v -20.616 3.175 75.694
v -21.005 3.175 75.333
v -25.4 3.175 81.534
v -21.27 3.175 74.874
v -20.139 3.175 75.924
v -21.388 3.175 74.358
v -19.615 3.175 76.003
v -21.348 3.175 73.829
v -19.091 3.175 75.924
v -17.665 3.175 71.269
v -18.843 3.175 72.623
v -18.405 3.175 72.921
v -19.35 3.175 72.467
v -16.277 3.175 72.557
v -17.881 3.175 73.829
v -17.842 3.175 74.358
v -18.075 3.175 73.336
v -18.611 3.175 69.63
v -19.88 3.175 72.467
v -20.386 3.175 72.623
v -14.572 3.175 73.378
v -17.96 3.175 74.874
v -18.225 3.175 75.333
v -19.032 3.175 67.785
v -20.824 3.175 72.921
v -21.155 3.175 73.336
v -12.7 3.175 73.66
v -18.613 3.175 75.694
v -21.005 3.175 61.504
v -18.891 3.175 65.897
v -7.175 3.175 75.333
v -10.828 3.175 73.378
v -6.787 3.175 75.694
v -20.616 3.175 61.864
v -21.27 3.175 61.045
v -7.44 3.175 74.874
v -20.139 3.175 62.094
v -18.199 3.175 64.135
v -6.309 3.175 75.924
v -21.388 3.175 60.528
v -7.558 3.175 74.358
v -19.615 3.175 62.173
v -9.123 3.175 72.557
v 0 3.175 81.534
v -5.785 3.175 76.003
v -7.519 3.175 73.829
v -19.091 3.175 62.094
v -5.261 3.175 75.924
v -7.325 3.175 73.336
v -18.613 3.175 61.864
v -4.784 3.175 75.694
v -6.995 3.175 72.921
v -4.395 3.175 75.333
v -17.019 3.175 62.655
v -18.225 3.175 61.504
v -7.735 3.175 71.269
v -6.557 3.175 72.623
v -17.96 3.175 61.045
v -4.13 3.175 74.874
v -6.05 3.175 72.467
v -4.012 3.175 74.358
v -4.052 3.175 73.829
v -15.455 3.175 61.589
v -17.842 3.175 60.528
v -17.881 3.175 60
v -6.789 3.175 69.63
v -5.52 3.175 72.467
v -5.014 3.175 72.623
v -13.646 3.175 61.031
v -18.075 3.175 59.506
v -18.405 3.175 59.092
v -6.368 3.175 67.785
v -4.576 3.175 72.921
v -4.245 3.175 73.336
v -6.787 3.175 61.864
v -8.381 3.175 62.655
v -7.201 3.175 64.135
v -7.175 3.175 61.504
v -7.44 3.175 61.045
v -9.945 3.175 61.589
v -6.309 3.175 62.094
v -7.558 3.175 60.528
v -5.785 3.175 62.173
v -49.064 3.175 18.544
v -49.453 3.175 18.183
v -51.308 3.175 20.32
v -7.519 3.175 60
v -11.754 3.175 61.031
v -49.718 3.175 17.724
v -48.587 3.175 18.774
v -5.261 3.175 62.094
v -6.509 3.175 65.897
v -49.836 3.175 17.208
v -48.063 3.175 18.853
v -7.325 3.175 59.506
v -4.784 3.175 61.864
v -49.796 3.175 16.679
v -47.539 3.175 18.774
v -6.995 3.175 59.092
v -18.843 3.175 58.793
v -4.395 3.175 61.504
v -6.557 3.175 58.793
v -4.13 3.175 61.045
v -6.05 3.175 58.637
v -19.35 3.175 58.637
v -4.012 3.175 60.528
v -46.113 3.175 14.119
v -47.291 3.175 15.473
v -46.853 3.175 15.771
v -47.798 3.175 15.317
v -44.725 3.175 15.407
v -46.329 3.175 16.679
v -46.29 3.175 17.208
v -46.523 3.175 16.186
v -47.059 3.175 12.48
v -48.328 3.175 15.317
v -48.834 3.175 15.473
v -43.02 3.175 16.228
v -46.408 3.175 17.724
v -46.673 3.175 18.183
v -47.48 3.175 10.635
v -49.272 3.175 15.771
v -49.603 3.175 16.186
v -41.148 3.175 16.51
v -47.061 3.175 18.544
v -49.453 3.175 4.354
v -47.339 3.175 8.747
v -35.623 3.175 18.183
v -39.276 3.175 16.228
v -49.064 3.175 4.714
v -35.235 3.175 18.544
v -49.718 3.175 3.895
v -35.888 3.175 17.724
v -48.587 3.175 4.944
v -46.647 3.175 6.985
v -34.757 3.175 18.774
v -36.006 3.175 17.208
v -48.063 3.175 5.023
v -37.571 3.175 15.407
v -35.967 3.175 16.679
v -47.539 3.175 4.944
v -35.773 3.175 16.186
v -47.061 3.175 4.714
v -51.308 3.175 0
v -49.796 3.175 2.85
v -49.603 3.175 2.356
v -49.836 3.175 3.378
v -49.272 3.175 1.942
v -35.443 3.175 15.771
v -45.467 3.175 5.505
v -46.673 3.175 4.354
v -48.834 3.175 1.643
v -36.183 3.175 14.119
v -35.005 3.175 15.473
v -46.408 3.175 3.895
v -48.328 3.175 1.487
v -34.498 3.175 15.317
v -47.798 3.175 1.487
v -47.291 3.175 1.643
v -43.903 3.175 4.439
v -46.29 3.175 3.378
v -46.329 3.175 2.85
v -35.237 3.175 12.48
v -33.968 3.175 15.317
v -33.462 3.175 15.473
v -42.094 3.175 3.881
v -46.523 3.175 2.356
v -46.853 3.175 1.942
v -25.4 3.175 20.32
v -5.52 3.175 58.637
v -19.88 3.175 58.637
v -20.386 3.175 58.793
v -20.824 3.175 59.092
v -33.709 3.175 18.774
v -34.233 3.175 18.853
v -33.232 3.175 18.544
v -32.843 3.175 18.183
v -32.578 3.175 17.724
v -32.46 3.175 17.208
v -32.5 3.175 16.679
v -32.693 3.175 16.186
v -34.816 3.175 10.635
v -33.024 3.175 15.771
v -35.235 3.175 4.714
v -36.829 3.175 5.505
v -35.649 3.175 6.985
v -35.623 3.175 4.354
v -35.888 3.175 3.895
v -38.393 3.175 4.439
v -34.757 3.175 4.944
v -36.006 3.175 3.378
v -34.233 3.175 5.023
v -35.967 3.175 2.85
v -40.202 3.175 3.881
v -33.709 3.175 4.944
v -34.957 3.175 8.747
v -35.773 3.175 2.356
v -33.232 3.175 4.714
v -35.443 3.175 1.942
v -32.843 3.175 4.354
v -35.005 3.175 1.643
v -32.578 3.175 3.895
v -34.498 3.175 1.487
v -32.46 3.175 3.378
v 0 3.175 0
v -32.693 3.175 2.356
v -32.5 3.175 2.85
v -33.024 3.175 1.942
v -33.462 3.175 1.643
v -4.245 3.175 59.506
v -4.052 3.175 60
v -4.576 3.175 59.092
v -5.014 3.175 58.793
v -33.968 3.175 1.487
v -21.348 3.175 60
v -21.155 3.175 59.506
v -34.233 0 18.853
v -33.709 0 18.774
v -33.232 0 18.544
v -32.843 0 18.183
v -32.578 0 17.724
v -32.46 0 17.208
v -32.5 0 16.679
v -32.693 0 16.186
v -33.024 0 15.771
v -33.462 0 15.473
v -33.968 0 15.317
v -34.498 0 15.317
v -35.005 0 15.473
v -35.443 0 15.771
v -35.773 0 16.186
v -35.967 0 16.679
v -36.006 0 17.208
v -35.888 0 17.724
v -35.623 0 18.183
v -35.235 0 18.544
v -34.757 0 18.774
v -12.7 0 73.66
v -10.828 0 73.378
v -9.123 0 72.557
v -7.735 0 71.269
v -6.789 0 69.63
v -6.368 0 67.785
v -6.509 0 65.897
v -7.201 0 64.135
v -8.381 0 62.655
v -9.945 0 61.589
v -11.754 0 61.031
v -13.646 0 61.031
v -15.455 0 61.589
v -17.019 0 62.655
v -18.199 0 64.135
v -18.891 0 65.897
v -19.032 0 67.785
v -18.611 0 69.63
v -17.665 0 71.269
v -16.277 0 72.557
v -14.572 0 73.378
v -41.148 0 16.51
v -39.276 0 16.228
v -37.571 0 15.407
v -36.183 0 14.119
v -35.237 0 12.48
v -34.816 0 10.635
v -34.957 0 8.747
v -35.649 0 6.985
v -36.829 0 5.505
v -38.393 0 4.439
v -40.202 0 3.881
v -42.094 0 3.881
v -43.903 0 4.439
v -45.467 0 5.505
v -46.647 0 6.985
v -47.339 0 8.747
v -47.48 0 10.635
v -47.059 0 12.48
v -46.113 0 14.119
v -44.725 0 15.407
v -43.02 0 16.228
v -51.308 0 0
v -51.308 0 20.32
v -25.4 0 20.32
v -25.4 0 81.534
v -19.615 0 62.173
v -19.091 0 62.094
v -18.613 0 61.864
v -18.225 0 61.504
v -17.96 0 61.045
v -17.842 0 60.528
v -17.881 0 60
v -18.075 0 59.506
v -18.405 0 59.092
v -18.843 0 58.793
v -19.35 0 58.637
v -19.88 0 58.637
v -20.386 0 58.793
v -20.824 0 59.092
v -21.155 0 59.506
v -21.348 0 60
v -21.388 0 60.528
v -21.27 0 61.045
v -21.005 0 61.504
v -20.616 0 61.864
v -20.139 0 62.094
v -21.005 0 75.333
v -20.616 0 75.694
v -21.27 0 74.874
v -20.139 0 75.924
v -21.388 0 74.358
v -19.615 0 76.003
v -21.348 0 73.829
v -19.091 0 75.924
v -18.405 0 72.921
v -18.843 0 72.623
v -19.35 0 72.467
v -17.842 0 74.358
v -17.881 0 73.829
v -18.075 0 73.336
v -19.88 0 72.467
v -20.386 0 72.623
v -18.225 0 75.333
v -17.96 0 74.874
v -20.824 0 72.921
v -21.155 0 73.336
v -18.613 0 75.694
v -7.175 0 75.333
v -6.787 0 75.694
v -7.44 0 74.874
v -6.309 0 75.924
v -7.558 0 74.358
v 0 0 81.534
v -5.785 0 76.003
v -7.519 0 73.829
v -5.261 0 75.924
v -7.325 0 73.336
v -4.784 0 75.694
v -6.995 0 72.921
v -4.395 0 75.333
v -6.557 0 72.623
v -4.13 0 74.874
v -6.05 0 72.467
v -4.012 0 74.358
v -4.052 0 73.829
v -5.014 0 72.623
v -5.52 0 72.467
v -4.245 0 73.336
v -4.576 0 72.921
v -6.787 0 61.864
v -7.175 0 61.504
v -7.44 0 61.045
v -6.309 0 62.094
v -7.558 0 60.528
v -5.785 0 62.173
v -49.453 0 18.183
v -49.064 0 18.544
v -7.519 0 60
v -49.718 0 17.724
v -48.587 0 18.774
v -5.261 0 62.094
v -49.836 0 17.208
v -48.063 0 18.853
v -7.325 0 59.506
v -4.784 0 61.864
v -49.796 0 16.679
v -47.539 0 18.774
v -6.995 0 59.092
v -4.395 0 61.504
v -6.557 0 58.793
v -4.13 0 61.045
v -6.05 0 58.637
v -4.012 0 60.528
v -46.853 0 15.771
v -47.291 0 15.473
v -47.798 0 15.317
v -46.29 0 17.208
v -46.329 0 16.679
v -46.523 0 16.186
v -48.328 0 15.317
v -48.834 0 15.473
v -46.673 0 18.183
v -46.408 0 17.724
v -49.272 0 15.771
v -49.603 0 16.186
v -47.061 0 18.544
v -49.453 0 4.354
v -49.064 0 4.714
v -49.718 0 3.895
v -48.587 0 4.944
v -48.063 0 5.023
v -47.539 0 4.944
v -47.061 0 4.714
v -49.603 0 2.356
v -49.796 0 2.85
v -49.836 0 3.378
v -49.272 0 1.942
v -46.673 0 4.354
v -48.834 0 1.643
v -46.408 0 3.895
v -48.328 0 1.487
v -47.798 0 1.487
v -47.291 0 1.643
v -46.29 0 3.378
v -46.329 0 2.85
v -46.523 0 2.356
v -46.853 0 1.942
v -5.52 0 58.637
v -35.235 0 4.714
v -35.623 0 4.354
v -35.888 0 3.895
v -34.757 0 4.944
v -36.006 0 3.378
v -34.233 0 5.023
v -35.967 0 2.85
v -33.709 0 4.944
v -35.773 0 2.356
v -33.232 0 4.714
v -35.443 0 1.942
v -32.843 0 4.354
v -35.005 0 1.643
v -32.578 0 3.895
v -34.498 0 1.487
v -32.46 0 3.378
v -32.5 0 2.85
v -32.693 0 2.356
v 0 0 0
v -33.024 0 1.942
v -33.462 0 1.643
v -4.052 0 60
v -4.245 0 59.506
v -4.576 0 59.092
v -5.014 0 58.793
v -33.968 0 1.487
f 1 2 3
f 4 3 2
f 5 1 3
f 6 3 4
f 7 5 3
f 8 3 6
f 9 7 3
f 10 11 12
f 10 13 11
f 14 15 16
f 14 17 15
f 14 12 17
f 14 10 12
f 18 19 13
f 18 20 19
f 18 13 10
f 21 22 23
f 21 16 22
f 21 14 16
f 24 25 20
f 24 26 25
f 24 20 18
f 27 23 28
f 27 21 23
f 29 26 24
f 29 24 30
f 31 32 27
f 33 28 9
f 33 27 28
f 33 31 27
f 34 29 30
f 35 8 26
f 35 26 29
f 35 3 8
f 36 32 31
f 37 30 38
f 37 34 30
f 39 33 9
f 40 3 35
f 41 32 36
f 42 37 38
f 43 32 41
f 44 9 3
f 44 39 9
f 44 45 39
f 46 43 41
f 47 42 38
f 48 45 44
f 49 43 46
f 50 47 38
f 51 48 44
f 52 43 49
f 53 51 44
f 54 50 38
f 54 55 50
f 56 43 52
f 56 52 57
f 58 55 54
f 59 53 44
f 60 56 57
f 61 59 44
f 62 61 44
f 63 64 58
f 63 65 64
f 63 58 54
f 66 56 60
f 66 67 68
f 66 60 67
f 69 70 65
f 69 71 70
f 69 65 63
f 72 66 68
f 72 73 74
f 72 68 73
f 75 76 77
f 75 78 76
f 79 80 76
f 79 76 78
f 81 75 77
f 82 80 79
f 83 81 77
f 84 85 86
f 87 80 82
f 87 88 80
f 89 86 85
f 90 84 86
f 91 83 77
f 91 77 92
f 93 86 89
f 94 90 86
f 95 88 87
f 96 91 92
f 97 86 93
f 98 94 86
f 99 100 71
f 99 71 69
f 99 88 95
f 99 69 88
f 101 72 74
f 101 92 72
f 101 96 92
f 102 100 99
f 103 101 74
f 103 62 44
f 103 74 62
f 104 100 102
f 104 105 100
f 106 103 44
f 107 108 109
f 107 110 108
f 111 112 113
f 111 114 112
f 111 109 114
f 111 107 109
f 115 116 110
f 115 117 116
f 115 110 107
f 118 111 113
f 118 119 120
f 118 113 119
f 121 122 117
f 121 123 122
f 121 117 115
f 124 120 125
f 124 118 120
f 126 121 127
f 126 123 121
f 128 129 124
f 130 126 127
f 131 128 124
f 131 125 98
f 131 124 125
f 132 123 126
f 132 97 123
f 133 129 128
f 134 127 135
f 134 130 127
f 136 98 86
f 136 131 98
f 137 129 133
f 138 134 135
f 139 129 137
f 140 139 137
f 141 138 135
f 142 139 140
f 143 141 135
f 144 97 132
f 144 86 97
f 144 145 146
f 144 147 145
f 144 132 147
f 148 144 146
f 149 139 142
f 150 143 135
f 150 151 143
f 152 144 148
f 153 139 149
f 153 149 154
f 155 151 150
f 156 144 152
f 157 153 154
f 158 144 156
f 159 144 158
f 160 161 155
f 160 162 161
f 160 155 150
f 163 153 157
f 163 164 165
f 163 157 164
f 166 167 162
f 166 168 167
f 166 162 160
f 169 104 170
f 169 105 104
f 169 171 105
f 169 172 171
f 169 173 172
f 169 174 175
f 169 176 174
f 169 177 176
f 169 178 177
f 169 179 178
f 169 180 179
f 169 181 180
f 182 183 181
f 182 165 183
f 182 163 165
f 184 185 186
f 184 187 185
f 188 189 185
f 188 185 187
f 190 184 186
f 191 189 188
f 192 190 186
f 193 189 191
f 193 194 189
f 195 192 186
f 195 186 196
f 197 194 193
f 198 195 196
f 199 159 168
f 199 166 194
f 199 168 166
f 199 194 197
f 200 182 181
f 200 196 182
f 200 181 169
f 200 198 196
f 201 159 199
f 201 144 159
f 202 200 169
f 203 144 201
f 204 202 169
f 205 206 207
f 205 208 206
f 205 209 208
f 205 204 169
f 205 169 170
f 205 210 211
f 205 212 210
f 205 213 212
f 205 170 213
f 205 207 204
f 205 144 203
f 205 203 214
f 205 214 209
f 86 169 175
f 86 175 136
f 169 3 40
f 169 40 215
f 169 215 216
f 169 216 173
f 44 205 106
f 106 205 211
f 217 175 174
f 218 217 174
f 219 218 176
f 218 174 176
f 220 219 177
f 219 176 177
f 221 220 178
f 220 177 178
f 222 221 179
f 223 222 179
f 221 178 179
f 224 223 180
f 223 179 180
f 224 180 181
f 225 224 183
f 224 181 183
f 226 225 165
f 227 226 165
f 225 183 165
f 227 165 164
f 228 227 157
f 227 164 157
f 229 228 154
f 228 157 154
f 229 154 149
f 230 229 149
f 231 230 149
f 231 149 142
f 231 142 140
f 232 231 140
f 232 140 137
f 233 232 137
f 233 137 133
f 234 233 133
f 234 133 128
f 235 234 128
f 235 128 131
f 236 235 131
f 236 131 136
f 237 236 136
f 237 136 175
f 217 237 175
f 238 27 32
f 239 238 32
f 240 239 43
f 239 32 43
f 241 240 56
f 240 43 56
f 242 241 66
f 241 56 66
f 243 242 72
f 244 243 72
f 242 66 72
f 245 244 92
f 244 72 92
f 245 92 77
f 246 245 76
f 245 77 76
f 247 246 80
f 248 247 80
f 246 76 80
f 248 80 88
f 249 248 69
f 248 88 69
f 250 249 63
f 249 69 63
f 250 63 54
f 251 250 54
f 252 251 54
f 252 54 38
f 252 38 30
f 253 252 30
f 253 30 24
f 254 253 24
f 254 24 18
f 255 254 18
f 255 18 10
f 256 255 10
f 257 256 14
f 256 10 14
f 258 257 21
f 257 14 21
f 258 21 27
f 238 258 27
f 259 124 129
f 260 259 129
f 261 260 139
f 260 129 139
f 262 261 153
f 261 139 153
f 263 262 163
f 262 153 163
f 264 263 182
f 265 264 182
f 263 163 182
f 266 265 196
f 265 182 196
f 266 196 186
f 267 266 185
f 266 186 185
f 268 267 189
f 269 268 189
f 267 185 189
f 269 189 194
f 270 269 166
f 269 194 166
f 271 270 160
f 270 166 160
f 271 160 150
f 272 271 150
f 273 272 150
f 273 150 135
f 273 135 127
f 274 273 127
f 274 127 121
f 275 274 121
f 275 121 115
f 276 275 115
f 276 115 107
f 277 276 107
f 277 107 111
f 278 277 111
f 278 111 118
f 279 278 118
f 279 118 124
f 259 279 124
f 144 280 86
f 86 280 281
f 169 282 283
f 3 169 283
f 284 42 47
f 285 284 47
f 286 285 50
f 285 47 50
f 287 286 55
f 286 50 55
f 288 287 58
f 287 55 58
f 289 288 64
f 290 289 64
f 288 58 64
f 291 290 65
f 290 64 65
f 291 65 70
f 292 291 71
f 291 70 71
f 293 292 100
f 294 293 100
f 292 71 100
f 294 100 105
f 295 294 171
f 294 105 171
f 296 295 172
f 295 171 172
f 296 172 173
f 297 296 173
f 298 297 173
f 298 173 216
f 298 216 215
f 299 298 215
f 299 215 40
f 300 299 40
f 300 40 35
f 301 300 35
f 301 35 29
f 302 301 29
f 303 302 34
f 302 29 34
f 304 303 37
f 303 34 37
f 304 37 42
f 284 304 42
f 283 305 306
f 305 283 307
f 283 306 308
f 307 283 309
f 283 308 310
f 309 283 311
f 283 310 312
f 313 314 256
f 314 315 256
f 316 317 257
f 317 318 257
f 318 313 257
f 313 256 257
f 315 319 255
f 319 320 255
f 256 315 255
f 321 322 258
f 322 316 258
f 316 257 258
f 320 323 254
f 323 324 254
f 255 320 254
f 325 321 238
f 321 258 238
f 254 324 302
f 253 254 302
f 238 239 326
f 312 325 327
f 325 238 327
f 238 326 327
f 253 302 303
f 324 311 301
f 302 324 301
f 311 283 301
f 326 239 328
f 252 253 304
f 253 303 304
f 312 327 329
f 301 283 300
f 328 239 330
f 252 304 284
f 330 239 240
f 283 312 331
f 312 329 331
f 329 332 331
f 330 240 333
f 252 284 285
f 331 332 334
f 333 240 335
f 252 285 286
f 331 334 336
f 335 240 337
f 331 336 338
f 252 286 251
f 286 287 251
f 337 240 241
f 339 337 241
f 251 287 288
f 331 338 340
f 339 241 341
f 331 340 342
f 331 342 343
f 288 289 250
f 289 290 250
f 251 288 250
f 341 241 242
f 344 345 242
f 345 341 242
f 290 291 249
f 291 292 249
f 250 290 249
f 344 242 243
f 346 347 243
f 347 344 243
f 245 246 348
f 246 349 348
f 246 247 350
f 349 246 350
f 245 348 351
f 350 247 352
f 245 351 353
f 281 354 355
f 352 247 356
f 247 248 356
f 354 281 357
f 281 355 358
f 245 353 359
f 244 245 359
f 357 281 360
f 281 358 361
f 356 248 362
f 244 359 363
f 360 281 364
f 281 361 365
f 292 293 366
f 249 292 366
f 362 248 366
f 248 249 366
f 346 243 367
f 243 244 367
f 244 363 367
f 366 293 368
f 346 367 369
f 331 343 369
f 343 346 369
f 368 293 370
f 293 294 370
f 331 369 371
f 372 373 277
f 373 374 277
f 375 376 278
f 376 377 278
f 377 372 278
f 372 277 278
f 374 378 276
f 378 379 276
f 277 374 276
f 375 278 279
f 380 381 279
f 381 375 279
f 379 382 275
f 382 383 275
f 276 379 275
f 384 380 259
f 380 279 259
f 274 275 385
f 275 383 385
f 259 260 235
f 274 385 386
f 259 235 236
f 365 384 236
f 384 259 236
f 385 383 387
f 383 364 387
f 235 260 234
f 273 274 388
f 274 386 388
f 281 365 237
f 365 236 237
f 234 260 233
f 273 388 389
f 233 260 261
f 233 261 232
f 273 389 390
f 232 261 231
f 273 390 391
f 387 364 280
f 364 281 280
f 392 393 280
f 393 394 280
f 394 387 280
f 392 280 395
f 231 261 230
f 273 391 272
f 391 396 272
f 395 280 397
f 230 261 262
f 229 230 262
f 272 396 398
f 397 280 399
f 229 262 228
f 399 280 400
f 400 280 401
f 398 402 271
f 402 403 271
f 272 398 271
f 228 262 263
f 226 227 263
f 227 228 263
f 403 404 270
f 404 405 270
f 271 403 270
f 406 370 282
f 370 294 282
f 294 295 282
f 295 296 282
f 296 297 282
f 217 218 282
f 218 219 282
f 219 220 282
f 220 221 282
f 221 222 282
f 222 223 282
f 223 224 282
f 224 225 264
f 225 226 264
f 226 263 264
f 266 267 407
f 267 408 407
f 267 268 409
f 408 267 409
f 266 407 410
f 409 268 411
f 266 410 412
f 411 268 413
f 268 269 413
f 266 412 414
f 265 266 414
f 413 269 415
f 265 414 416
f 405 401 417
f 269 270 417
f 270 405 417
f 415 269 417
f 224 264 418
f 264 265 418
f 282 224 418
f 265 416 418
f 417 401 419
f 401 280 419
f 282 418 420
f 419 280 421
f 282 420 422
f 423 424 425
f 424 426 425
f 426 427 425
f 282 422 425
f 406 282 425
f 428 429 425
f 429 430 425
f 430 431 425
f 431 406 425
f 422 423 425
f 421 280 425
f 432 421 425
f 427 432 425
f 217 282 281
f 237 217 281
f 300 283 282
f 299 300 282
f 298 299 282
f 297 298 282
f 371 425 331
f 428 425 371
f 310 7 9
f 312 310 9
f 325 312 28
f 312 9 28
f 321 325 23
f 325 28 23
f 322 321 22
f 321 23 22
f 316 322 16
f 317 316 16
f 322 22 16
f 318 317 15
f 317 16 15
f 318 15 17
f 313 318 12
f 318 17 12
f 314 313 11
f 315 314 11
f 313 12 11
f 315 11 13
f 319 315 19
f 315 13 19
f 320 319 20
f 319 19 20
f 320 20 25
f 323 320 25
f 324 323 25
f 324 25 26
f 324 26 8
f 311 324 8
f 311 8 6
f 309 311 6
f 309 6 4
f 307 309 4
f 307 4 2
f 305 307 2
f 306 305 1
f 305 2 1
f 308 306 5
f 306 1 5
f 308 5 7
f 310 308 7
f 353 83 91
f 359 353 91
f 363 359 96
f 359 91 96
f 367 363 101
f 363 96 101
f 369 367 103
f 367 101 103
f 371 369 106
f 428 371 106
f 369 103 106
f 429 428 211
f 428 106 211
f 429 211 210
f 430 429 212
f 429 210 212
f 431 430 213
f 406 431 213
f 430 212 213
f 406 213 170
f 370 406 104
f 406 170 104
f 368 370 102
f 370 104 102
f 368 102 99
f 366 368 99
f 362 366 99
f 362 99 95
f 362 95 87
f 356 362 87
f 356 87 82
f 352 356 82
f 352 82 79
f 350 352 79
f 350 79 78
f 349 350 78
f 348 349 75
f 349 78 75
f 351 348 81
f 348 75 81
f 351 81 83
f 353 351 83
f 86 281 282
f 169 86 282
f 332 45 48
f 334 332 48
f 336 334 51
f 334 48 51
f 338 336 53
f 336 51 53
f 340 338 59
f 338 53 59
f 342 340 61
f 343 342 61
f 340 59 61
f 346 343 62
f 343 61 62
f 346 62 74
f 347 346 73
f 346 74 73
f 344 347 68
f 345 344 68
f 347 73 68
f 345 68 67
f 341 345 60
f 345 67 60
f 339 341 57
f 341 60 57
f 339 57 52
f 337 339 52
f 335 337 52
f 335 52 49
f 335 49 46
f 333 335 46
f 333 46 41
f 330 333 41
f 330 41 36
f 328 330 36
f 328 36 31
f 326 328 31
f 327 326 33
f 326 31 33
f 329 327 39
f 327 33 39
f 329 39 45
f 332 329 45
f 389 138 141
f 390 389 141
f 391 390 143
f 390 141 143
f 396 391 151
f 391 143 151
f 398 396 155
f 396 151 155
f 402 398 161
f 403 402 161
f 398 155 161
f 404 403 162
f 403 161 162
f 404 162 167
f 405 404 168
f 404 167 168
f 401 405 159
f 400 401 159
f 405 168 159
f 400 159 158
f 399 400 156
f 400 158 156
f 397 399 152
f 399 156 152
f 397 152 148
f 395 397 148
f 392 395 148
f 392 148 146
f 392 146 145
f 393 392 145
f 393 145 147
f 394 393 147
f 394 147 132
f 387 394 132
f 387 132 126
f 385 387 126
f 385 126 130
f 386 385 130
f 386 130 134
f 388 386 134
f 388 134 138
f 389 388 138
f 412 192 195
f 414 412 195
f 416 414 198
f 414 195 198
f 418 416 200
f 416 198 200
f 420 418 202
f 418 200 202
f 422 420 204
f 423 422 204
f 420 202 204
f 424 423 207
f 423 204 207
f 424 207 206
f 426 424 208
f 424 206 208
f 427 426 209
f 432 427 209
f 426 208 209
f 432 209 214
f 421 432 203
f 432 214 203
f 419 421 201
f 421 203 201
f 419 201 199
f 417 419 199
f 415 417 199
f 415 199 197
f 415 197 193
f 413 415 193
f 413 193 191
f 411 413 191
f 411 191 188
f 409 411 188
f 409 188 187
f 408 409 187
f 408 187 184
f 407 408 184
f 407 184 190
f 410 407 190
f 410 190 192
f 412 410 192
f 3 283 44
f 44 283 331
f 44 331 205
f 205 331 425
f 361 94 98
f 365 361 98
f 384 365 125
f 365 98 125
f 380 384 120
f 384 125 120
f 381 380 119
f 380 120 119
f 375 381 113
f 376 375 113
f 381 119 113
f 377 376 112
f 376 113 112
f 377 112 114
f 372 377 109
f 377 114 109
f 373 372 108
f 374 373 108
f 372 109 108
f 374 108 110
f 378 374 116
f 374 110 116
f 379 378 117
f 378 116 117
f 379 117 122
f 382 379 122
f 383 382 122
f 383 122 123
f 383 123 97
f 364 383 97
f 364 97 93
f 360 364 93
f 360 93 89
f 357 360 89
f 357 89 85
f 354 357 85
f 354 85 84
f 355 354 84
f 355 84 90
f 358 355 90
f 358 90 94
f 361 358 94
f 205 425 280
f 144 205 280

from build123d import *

# Parameters (mm, degrees)
BOSS_EXTRUDE1_DEPTH = 3.175
SKETCH7_R           = 6.35
SKETCH7_R_2         = 1.778
CUT_EXTRUDE3_DEPTH  = 3.175
CUT_EXTRUDE4_REACH  = 98.387
SKETCH8_R           = 6.35
SKETCH8_R_2         = 1.778


with BuildPart() as part:
    # Sketch1 → Boss-Extrude1 (new body)
    with BuildSketch(Plane(origin=(0, 0, 0), x_dir=(1, 0, 0), z_dir=(0, 1, 0))):
        Polygon((0, 0), (-51.308, 0), (-51.308, -20.32), (-25.4, -20.32), (-25.4, -81.534), (0, -81.534), align=None)
    extrude(amount=BOSS_EXTRUDE1_DEPTH)

    # Sketch7 → Cut-Extrude3 (cut)
    with BuildSketch(Plane(origin=(0, 3.175, 0), x_dir=(1, 0, 0), z_dir=(0, 1, 0))):
        with Locations(Location((-12.7, -67.31, 0), (0, 0, 270))):
            Circle(SKETCH7_R)
        with Locations(Location((-5.785202787, -60.395202787, 0), (0, 0, 270))):
            Circle(SKETCH7_R_2)
        with Locations(Location((-5.785202787, -74.224797213, 0), (0, 0, 270))):
            Circle(SKETCH7_R_2)
        with Locations(Location((-19.614797213, -74.224797213, 0), (0, 0, 270))):
            Circle(SKETCH7_R_2)
        with Locations(Location((-19.614797213, -60.395202787, 0), (0, 0, 270))):
            Circle(SKETCH7_R_2)
    extrude(amount=-CUT_EXTRUDE3_DEPTH, mode=Mode.SUBTRACT)

    # Sketch8 → Cut-Extrude4 (cut, up to next)
    with BuildSketch(Plane(origin=(0, 3.175, 0), x_dir=(1, 0, 0), z_dir=(0, 1, 0)), mode=Mode.PRIVATE) as cut_extrude4_sk1:
        with Locations(Location((-41.148, -10.16, 0), (0, 0, 270))):
            Circle(SKETCH8_R)
    cut_extrude4_tool1 = extrude(cut_extrude4_sk1.sketch, amount=-CUT_EXTRUDE4_REACH, mode=Mode.PRIVATE) & part.part
    # Sketch8 → Cut-Extrude4 (cut, up to next)
    with BuildSketch(Plane(origin=(0, 3.175, 0), x_dir=(1, 0, 0), z_dir=(0, 1, 0)), mode=Mode.PRIVATE) as cut_extrude4_sk2:
        with Locations(Location((-48.062797213, -3.245202787, 0), (0, 0, 270))):
            Circle(SKETCH8_R_2)
    cut_extrude4_tool2 = extrude(cut_extrude4_sk2.sketch, amount=-CUT_EXTRUDE4_REACH, mode=Mode.PRIVATE) & part.part
    # Sketch8 → Cut-Extrude4 (cut, up to next)
    with BuildSketch(Plane(origin=(0, 3.175, 0), x_dir=(1, 0, 0), z_dir=(0, 1, 0)), mode=Mode.PRIVATE) as cut_extrude4_sk3:
        with Locations(Location((-34.233202787, -3.245202787, 0), (0, 0, 270))):
            Circle(SKETCH8_R_2)
    cut_extrude4_tool3 = extrude(cut_extrude4_sk3.sketch, amount=-CUT_EXTRUDE4_REACH, mode=Mode.PRIVATE) & part.part
    # Sketch8 → Cut-Extrude4 (cut, up to next)
    with BuildSketch(Plane(origin=(0, 3.175, 0), x_dir=(1, 0, 0), z_dir=(0, 1, 0)), mode=Mode.PRIVATE) as cut_extrude4_sk4:
        with Locations(Location((-34.233202787, -17.074797213, 0), (0, 0, 270))):
            Circle(SKETCH8_R_2)
    cut_extrude4_tool4 = extrude(cut_extrude4_sk4.sketch, amount=-CUT_EXTRUDE4_REACH, mode=Mode.PRIVATE) & part.part
    # Sketch8 → Cut-Extrude4 (cut, up to next)
    with BuildSketch(Plane(origin=(0, 3.175, 0), x_dir=(1, 0, 0), z_dir=(0, 1, 0)), mode=Mode.PRIVATE) as cut_extrude4_sk5:
        with Locations(Location((-48.062797213, -17.074797213, 0), (0, 0, 270))):
            Circle(SKETCH8_R_2)
    cut_extrude4_tool5 = extrude(cut_extrude4_sk5.sketch, amount=-CUT_EXTRUDE4_REACH, mode=Mode.PRIVATE) & part.part
    add(cut_extrude4_tool1.solids().sort_by_distance((-41.148, 3.175, 10.16))[0], mode=Mode.SUBTRACT)
    add(cut_extrude4_tool2.solids().sort_by_distance((-48.062797, 3.175, 3.245203))[0], mode=Mode.SUBTRACT)
    add(cut_extrude4_tool3.solids().sort_by_distance((-34.233203, 3.175, 3.245203))[0], mode=Mode.SUBTRACT)
    add(cut_extrude4_tool4.solids().sort_by_distance((-34.233203, 3.175, 17.074797))[0], mode=Mode.SUBTRACT)
    add(cut_extrude4_tool5.solids().sort_by_distance((-48.062797, 3.175, 17.074797))[0], mode=Mode.SUBTRACT)


solid = part.part
